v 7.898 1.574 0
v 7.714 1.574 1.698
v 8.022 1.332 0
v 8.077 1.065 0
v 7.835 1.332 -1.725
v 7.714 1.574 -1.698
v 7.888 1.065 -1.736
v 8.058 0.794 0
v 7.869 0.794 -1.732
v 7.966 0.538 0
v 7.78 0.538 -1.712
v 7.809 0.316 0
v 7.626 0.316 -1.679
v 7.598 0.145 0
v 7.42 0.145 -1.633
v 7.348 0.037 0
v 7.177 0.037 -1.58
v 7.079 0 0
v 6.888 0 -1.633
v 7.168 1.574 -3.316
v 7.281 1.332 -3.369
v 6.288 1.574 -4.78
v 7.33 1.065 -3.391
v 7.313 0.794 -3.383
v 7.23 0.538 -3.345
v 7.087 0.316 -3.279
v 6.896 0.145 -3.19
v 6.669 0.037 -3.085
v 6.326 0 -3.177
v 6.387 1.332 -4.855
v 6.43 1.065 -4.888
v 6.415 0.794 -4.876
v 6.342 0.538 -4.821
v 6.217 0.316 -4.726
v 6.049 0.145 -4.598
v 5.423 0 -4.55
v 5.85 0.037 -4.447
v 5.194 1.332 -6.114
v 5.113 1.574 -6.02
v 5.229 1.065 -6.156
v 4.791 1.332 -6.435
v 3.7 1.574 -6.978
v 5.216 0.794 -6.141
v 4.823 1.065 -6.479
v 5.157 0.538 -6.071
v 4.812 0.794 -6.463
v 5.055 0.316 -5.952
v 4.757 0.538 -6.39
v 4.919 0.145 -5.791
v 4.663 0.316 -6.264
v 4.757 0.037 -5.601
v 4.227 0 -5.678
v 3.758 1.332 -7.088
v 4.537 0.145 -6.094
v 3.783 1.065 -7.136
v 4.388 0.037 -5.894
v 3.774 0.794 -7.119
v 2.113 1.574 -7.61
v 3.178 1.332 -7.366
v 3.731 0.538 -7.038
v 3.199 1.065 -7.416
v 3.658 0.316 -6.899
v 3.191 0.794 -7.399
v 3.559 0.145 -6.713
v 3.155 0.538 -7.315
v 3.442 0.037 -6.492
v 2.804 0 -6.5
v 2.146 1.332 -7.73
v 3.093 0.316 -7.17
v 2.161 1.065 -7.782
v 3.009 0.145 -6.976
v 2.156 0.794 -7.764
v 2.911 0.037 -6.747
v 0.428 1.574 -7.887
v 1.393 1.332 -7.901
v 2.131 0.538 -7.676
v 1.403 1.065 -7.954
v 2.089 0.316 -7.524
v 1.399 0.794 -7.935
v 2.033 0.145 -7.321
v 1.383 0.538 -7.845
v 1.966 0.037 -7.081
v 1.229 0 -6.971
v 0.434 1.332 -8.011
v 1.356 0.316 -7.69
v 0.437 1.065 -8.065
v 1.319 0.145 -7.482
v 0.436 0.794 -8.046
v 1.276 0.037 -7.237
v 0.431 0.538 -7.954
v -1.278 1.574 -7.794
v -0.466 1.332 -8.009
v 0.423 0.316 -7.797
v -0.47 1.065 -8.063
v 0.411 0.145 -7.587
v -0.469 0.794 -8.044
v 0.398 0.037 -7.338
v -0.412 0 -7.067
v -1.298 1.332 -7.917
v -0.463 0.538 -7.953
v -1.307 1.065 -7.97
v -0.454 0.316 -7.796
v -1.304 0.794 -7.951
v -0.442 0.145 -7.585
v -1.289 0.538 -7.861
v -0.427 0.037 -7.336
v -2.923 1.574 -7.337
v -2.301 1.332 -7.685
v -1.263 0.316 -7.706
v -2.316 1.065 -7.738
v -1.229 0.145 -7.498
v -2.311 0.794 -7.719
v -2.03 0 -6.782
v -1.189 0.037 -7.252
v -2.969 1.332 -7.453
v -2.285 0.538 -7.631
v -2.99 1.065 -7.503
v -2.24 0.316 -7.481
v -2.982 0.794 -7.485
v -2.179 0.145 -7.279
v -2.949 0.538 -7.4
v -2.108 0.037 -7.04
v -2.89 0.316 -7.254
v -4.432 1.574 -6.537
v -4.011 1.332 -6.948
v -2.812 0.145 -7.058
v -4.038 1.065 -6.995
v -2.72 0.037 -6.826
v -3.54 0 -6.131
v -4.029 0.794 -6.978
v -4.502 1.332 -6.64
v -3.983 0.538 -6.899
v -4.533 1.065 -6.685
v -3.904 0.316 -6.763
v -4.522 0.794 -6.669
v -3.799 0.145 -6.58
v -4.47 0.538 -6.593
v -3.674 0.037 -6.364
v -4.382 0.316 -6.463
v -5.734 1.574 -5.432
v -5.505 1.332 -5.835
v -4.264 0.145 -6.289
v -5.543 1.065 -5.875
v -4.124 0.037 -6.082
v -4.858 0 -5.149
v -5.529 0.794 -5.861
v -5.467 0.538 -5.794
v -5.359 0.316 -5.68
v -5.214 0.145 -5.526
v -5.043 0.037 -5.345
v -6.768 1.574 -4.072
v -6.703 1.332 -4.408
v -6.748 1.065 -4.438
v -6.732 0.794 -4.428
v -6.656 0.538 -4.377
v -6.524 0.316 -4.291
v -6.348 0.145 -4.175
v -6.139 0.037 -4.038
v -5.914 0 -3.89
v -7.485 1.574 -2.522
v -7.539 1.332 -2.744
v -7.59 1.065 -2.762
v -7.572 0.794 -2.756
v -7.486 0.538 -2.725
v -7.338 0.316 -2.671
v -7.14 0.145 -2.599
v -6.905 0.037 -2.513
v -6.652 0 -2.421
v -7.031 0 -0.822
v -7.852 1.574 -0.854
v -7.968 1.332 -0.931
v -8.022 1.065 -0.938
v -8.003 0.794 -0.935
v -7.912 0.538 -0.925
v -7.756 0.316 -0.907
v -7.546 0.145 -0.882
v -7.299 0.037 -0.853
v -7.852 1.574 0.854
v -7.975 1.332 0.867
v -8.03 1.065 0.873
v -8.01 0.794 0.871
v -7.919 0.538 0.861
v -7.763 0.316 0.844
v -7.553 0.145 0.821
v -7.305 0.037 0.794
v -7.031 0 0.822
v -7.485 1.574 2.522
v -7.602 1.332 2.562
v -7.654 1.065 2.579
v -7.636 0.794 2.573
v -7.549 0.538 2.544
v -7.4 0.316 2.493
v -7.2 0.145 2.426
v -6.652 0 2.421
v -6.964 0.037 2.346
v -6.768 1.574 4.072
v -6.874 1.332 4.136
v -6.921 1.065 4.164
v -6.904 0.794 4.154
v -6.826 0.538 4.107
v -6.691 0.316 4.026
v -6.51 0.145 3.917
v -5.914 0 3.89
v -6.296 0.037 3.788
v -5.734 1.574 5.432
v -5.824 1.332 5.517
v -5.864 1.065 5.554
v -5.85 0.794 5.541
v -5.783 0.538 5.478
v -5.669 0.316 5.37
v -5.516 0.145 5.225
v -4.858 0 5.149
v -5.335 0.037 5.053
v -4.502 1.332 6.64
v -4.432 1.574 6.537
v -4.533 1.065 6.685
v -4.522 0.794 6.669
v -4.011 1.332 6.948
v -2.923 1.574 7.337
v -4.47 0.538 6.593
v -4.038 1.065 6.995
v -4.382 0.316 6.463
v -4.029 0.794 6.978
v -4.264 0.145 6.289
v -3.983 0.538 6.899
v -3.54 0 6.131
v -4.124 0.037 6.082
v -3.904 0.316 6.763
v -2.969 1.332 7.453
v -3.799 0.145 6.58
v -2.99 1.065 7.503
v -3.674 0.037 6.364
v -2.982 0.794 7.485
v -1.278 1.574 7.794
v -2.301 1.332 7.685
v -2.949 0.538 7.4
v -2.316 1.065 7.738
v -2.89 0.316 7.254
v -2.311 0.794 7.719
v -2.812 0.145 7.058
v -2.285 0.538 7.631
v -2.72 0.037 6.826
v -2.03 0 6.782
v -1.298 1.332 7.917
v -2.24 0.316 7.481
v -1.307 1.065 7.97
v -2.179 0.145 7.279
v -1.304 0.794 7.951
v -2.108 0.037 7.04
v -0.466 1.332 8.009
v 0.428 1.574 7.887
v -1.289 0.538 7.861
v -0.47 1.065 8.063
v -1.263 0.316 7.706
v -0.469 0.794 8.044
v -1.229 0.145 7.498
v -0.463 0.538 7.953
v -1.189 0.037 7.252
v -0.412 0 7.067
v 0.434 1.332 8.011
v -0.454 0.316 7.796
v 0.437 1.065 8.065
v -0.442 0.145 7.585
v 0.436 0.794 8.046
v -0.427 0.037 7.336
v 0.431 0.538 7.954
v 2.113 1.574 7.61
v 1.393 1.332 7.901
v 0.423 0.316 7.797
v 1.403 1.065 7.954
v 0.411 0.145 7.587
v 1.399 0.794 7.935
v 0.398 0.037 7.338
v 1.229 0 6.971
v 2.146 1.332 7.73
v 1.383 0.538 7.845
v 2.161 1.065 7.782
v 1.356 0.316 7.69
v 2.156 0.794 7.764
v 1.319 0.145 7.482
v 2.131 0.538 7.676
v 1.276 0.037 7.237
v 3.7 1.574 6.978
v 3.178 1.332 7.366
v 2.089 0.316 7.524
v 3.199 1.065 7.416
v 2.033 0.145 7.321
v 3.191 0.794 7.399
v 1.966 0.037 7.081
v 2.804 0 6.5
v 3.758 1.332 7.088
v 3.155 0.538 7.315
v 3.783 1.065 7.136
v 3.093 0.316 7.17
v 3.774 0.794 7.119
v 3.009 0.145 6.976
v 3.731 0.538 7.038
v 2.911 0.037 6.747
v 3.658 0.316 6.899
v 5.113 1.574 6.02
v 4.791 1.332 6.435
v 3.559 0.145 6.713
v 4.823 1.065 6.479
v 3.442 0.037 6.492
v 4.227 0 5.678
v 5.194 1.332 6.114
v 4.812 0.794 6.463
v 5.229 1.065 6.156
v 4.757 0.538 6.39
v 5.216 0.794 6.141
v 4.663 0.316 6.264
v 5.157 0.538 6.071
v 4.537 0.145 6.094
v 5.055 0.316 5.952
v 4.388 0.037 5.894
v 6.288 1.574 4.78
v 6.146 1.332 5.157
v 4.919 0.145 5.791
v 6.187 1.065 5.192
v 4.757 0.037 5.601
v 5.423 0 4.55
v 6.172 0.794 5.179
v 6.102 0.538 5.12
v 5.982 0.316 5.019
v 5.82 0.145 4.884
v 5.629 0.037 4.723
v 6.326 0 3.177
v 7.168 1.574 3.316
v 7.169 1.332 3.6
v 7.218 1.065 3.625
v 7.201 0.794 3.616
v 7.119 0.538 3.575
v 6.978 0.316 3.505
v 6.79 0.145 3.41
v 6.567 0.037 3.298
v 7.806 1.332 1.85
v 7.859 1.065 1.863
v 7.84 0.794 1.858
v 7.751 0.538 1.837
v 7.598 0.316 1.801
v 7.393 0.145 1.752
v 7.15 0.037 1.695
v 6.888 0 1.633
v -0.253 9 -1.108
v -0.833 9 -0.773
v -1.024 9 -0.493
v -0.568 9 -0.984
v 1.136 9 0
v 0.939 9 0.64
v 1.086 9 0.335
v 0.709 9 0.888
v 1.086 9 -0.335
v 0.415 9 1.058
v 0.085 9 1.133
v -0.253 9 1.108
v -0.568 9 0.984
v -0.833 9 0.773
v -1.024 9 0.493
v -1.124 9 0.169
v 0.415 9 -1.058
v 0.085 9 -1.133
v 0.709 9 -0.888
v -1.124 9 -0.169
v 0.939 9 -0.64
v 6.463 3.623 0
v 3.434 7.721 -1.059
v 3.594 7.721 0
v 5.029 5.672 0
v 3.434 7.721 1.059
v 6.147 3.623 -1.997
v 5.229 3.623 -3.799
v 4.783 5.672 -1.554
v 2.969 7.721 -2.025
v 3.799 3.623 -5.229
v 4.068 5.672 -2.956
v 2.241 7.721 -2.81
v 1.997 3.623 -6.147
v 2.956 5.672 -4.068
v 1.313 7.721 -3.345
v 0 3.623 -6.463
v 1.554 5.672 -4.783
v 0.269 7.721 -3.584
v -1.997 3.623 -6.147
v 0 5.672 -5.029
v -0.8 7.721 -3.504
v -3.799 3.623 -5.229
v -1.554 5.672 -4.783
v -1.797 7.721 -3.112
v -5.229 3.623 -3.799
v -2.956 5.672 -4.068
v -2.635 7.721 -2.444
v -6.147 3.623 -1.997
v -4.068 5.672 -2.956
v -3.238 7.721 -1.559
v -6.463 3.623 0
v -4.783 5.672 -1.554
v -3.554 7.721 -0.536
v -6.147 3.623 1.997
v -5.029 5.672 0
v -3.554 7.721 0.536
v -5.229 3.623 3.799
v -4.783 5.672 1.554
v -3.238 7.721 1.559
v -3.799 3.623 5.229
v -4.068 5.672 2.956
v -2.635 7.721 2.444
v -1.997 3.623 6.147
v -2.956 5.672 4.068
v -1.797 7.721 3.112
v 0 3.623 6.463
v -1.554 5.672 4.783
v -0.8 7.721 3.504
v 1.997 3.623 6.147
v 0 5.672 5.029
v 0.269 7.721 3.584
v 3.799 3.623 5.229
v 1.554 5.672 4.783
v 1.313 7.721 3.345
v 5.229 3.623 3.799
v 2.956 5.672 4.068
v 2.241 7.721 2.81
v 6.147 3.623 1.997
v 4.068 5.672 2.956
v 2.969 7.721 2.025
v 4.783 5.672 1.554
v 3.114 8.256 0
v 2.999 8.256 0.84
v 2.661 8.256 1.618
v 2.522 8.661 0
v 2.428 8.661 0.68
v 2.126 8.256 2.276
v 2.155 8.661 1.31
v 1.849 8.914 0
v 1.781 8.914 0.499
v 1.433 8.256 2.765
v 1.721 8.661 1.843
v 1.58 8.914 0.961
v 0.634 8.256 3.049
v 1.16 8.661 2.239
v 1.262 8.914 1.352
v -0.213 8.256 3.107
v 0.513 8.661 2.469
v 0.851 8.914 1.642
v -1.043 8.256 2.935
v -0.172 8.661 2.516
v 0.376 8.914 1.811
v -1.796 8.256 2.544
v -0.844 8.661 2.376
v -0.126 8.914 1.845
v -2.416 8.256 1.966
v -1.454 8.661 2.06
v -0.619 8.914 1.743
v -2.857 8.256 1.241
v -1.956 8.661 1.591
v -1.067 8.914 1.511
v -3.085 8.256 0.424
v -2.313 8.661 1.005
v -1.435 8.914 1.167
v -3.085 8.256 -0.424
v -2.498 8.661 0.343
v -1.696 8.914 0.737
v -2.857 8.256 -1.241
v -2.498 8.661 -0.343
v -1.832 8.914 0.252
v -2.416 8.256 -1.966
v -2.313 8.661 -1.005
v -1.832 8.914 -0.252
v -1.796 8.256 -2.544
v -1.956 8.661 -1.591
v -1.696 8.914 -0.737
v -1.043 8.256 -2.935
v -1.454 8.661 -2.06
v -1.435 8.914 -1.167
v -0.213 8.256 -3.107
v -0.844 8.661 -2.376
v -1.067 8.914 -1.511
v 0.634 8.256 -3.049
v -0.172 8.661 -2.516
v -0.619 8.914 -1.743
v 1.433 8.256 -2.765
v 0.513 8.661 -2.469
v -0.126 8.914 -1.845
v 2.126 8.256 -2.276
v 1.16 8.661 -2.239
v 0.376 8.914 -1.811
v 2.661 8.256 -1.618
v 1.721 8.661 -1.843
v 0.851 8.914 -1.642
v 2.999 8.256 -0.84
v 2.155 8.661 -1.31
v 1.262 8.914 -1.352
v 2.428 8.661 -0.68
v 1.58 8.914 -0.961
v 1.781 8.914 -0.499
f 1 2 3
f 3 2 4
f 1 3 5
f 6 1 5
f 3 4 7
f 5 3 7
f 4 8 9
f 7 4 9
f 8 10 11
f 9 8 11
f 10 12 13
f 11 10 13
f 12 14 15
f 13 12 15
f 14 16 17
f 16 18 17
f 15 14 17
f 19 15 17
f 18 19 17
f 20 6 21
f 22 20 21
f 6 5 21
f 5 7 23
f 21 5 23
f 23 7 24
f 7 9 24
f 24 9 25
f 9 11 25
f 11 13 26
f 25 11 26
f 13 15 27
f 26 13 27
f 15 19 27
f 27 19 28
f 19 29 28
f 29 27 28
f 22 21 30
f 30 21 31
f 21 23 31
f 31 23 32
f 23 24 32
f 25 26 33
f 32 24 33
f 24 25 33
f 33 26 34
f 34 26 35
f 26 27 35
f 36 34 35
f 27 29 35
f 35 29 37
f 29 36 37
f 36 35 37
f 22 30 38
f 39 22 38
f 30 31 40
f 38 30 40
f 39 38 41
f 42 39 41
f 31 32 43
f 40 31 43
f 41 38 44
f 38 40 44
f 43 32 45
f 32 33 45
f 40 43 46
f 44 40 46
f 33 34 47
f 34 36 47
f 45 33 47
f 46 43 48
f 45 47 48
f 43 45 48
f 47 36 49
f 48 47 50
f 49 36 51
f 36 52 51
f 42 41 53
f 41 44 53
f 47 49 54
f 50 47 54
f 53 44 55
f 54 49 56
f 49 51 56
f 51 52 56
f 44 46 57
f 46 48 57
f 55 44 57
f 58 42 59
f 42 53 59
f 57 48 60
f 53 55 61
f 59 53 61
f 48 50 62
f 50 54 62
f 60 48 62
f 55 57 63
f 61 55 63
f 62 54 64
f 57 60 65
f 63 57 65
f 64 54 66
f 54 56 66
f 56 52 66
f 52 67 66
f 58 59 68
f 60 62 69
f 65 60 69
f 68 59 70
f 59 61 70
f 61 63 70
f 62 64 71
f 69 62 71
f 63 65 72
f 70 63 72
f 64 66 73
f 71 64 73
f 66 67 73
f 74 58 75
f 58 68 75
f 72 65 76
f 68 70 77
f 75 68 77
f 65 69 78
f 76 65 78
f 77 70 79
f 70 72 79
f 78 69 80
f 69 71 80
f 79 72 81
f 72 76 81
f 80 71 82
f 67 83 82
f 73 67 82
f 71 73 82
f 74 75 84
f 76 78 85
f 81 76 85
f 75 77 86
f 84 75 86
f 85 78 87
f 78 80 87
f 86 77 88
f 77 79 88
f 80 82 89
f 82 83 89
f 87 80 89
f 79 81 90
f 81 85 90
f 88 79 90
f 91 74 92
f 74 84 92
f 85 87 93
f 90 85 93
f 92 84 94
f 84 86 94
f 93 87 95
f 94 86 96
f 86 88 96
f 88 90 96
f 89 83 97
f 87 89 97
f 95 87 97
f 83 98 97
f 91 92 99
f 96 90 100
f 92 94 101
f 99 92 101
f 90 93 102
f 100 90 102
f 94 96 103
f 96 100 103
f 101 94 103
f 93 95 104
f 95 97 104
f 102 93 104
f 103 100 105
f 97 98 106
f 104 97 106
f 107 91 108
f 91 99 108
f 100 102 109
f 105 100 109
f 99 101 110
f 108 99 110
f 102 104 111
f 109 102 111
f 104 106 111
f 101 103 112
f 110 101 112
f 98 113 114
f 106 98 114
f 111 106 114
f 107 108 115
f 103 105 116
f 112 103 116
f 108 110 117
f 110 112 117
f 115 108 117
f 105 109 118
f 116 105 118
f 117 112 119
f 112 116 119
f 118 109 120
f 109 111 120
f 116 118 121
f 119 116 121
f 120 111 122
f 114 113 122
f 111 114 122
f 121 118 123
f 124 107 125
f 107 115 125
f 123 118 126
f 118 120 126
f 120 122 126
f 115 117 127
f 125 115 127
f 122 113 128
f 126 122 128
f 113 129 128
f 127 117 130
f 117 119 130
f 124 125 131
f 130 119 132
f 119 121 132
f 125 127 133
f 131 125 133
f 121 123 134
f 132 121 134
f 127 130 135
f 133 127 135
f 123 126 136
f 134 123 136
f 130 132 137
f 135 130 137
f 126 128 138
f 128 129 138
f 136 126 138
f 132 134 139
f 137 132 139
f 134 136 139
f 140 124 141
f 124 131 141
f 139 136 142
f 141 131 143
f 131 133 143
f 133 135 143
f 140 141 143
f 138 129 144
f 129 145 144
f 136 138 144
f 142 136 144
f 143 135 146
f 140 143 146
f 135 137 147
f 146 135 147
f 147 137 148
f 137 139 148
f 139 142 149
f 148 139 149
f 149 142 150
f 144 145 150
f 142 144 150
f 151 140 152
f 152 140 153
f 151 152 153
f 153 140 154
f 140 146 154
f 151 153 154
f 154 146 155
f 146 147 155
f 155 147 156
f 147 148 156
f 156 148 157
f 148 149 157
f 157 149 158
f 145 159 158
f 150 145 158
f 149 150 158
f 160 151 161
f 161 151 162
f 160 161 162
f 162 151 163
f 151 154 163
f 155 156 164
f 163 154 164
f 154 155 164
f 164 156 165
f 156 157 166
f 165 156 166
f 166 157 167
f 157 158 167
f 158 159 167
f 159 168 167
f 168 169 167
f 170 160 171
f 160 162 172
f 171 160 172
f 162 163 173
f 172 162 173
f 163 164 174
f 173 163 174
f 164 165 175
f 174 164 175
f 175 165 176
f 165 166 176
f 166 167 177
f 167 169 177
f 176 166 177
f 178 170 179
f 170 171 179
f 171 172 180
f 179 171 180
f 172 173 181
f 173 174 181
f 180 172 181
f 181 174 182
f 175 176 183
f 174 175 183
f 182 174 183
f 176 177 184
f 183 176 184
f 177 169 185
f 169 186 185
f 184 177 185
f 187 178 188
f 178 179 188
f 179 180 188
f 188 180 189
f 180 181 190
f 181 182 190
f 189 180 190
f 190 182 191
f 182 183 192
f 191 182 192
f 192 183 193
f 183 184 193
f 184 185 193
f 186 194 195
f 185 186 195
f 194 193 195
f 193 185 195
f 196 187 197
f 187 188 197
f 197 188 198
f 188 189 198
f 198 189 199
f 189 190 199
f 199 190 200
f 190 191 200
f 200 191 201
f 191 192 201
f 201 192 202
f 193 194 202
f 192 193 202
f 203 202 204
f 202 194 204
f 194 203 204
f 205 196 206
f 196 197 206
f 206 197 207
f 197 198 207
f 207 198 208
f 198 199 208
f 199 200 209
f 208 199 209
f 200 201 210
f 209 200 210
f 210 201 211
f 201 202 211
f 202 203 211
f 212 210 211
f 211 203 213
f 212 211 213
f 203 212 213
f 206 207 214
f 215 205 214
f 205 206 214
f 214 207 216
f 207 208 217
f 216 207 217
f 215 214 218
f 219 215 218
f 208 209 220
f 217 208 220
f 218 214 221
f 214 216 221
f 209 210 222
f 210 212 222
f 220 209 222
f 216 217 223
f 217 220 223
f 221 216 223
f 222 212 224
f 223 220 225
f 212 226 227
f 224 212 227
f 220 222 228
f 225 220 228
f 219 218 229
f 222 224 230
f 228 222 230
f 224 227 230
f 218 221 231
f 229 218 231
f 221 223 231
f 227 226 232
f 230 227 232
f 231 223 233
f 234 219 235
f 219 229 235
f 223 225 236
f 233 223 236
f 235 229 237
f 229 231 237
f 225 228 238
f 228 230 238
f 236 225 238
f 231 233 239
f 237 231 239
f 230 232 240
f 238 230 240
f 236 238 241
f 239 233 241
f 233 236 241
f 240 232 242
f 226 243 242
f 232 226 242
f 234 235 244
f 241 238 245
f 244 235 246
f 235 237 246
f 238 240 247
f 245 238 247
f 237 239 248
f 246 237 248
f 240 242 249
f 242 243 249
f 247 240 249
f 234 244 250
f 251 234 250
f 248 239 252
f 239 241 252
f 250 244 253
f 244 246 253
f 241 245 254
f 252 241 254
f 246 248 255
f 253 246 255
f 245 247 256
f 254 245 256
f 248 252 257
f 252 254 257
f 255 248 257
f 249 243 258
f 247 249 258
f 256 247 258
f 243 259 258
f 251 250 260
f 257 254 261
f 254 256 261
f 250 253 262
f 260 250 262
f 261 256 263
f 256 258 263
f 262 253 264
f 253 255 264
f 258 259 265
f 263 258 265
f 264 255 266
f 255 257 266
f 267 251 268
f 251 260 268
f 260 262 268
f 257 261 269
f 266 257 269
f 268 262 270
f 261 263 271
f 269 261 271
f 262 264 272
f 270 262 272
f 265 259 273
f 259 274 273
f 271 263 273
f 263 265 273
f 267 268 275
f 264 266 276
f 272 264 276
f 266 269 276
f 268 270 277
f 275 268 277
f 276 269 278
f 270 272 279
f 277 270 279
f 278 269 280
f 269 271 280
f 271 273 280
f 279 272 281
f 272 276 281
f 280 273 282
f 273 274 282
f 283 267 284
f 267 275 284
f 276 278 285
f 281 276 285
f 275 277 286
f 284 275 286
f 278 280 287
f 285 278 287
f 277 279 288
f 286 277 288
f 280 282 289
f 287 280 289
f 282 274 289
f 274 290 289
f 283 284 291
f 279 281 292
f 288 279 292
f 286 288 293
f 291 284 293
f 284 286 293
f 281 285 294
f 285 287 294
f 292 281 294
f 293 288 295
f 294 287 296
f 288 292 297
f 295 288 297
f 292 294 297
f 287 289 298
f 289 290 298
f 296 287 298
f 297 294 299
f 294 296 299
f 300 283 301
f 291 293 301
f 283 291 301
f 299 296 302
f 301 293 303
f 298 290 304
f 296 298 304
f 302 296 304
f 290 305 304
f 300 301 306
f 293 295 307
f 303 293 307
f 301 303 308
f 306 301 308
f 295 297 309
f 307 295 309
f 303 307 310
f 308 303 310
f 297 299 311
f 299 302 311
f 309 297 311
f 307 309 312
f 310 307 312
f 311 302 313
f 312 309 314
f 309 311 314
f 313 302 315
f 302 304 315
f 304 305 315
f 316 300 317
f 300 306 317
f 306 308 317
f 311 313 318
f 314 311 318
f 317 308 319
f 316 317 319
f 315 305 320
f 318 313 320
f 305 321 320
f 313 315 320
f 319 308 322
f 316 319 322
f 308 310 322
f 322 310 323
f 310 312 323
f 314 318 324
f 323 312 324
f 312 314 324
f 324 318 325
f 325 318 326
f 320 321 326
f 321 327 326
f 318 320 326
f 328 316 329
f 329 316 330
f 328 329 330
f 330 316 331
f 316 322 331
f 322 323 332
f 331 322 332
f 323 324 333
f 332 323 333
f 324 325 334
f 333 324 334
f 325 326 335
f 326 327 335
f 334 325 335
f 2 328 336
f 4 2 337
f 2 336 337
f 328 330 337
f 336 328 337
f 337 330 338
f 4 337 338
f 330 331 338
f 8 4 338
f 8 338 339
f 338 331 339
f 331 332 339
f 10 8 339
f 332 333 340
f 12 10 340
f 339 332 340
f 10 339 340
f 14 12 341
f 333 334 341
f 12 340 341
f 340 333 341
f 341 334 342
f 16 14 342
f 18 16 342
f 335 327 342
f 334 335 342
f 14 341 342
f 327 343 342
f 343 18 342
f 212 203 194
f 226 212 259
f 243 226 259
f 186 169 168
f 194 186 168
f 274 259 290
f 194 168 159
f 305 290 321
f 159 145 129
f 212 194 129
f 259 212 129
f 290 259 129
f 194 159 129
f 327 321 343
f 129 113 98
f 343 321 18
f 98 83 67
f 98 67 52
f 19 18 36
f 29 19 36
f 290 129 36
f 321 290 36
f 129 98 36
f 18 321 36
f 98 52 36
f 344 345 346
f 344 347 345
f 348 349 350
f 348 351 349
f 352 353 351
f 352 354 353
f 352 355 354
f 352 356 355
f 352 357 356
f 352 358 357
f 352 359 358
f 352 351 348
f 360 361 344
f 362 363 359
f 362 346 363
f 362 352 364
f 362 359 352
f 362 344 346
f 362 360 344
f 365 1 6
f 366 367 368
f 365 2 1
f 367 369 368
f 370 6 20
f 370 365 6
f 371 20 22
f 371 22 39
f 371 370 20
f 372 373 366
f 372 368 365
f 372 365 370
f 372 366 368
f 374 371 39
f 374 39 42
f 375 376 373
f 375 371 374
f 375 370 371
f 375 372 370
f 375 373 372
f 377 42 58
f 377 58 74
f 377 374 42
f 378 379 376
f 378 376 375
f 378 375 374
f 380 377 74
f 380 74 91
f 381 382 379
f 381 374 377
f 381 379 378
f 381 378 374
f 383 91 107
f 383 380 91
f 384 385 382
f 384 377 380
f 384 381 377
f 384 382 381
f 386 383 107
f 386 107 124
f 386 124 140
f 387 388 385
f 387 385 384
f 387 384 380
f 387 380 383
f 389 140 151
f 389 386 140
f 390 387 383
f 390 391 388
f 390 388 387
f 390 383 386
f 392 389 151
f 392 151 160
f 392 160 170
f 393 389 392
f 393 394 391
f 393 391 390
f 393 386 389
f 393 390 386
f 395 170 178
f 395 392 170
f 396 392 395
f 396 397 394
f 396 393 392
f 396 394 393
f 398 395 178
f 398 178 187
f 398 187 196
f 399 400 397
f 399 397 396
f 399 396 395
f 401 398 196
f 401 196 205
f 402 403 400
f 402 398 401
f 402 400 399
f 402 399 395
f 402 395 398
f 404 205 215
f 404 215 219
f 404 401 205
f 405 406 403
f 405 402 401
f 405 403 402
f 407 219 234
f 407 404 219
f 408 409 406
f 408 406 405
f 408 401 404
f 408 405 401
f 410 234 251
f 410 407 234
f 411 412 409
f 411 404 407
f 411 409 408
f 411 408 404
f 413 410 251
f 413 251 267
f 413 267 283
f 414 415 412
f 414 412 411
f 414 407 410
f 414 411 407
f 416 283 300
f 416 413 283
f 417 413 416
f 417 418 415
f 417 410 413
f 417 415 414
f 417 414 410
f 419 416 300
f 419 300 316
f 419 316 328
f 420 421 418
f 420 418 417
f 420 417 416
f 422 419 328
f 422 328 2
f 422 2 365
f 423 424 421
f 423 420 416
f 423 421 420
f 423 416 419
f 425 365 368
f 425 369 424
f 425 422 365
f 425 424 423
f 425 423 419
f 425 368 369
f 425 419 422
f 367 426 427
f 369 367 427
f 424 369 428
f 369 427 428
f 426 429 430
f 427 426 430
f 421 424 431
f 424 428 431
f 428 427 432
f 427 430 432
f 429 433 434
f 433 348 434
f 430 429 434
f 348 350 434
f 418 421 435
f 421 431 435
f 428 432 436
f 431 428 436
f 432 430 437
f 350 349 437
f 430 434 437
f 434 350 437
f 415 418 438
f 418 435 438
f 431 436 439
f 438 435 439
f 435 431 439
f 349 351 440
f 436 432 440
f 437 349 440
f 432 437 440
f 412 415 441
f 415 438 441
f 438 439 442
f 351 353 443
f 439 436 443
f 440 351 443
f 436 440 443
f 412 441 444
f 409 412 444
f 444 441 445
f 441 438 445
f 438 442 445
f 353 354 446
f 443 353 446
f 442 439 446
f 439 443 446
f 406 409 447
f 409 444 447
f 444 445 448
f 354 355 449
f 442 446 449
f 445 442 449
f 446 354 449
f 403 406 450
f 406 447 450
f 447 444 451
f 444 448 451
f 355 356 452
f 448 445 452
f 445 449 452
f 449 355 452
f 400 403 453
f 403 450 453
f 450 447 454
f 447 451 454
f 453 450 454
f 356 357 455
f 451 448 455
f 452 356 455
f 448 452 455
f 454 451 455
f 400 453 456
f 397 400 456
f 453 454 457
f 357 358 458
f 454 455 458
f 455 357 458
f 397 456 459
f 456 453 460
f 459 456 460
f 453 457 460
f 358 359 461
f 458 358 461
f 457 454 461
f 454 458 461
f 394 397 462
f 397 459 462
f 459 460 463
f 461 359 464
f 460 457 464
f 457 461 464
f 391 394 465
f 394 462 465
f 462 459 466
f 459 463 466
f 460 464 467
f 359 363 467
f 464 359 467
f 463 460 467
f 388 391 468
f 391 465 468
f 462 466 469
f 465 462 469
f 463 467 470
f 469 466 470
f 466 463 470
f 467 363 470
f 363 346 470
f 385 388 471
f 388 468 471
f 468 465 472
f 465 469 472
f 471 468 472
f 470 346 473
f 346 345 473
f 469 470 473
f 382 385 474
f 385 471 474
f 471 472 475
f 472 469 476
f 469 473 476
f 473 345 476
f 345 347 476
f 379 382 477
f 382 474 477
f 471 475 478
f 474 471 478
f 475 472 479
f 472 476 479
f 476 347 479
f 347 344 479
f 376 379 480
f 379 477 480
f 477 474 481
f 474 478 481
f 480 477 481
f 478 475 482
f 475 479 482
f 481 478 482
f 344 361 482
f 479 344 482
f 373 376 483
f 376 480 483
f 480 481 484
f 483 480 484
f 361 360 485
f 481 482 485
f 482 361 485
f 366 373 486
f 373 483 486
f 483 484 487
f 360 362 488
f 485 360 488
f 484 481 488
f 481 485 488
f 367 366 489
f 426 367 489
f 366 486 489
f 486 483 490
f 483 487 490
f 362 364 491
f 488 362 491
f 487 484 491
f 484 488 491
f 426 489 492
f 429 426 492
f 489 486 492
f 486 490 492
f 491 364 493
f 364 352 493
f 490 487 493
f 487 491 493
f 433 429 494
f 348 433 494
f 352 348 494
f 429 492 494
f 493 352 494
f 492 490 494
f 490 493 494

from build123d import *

# Parameters (mm, degrees)
SKETCH3_R           = 9
BOSS_EXTRUDE3_DEPTH = 9
BOSS_EXTRUDE3_TAPER = 35
FILLET1_R           = 3
FILLET2_R           = 1


with BuildPart() as part:
    # Sketch3 → Boss-Extrude3 (new body)
    with BuildSketch(Plane(origin=(0, 0, 0), x_dir=(1, 0, 0), z_dir=(0, 1, 0))):
        Circle(SKETCH3_R)
    extrude(amount=BOSS_EXTRUDE3_DEPTH, taper=BOSS_EXTRUDE3_TAPER)

    # Fillet1
    fillet1_edges = [part.edges().sort_by_distance(p)[0] for p in [
        (-2.698132156, 9, 0),
    ]]
    fillet(fillet1_edges, radius=FILLET1_R)

    # Fillet2
    fillet2_edges = [part.edges().sort_by_distance(p)[0] for p in [
        (-9, 0, 0),
    ]]
    fillet(fillet2_edges, radius=FILLET2_R)


solid = part.part
